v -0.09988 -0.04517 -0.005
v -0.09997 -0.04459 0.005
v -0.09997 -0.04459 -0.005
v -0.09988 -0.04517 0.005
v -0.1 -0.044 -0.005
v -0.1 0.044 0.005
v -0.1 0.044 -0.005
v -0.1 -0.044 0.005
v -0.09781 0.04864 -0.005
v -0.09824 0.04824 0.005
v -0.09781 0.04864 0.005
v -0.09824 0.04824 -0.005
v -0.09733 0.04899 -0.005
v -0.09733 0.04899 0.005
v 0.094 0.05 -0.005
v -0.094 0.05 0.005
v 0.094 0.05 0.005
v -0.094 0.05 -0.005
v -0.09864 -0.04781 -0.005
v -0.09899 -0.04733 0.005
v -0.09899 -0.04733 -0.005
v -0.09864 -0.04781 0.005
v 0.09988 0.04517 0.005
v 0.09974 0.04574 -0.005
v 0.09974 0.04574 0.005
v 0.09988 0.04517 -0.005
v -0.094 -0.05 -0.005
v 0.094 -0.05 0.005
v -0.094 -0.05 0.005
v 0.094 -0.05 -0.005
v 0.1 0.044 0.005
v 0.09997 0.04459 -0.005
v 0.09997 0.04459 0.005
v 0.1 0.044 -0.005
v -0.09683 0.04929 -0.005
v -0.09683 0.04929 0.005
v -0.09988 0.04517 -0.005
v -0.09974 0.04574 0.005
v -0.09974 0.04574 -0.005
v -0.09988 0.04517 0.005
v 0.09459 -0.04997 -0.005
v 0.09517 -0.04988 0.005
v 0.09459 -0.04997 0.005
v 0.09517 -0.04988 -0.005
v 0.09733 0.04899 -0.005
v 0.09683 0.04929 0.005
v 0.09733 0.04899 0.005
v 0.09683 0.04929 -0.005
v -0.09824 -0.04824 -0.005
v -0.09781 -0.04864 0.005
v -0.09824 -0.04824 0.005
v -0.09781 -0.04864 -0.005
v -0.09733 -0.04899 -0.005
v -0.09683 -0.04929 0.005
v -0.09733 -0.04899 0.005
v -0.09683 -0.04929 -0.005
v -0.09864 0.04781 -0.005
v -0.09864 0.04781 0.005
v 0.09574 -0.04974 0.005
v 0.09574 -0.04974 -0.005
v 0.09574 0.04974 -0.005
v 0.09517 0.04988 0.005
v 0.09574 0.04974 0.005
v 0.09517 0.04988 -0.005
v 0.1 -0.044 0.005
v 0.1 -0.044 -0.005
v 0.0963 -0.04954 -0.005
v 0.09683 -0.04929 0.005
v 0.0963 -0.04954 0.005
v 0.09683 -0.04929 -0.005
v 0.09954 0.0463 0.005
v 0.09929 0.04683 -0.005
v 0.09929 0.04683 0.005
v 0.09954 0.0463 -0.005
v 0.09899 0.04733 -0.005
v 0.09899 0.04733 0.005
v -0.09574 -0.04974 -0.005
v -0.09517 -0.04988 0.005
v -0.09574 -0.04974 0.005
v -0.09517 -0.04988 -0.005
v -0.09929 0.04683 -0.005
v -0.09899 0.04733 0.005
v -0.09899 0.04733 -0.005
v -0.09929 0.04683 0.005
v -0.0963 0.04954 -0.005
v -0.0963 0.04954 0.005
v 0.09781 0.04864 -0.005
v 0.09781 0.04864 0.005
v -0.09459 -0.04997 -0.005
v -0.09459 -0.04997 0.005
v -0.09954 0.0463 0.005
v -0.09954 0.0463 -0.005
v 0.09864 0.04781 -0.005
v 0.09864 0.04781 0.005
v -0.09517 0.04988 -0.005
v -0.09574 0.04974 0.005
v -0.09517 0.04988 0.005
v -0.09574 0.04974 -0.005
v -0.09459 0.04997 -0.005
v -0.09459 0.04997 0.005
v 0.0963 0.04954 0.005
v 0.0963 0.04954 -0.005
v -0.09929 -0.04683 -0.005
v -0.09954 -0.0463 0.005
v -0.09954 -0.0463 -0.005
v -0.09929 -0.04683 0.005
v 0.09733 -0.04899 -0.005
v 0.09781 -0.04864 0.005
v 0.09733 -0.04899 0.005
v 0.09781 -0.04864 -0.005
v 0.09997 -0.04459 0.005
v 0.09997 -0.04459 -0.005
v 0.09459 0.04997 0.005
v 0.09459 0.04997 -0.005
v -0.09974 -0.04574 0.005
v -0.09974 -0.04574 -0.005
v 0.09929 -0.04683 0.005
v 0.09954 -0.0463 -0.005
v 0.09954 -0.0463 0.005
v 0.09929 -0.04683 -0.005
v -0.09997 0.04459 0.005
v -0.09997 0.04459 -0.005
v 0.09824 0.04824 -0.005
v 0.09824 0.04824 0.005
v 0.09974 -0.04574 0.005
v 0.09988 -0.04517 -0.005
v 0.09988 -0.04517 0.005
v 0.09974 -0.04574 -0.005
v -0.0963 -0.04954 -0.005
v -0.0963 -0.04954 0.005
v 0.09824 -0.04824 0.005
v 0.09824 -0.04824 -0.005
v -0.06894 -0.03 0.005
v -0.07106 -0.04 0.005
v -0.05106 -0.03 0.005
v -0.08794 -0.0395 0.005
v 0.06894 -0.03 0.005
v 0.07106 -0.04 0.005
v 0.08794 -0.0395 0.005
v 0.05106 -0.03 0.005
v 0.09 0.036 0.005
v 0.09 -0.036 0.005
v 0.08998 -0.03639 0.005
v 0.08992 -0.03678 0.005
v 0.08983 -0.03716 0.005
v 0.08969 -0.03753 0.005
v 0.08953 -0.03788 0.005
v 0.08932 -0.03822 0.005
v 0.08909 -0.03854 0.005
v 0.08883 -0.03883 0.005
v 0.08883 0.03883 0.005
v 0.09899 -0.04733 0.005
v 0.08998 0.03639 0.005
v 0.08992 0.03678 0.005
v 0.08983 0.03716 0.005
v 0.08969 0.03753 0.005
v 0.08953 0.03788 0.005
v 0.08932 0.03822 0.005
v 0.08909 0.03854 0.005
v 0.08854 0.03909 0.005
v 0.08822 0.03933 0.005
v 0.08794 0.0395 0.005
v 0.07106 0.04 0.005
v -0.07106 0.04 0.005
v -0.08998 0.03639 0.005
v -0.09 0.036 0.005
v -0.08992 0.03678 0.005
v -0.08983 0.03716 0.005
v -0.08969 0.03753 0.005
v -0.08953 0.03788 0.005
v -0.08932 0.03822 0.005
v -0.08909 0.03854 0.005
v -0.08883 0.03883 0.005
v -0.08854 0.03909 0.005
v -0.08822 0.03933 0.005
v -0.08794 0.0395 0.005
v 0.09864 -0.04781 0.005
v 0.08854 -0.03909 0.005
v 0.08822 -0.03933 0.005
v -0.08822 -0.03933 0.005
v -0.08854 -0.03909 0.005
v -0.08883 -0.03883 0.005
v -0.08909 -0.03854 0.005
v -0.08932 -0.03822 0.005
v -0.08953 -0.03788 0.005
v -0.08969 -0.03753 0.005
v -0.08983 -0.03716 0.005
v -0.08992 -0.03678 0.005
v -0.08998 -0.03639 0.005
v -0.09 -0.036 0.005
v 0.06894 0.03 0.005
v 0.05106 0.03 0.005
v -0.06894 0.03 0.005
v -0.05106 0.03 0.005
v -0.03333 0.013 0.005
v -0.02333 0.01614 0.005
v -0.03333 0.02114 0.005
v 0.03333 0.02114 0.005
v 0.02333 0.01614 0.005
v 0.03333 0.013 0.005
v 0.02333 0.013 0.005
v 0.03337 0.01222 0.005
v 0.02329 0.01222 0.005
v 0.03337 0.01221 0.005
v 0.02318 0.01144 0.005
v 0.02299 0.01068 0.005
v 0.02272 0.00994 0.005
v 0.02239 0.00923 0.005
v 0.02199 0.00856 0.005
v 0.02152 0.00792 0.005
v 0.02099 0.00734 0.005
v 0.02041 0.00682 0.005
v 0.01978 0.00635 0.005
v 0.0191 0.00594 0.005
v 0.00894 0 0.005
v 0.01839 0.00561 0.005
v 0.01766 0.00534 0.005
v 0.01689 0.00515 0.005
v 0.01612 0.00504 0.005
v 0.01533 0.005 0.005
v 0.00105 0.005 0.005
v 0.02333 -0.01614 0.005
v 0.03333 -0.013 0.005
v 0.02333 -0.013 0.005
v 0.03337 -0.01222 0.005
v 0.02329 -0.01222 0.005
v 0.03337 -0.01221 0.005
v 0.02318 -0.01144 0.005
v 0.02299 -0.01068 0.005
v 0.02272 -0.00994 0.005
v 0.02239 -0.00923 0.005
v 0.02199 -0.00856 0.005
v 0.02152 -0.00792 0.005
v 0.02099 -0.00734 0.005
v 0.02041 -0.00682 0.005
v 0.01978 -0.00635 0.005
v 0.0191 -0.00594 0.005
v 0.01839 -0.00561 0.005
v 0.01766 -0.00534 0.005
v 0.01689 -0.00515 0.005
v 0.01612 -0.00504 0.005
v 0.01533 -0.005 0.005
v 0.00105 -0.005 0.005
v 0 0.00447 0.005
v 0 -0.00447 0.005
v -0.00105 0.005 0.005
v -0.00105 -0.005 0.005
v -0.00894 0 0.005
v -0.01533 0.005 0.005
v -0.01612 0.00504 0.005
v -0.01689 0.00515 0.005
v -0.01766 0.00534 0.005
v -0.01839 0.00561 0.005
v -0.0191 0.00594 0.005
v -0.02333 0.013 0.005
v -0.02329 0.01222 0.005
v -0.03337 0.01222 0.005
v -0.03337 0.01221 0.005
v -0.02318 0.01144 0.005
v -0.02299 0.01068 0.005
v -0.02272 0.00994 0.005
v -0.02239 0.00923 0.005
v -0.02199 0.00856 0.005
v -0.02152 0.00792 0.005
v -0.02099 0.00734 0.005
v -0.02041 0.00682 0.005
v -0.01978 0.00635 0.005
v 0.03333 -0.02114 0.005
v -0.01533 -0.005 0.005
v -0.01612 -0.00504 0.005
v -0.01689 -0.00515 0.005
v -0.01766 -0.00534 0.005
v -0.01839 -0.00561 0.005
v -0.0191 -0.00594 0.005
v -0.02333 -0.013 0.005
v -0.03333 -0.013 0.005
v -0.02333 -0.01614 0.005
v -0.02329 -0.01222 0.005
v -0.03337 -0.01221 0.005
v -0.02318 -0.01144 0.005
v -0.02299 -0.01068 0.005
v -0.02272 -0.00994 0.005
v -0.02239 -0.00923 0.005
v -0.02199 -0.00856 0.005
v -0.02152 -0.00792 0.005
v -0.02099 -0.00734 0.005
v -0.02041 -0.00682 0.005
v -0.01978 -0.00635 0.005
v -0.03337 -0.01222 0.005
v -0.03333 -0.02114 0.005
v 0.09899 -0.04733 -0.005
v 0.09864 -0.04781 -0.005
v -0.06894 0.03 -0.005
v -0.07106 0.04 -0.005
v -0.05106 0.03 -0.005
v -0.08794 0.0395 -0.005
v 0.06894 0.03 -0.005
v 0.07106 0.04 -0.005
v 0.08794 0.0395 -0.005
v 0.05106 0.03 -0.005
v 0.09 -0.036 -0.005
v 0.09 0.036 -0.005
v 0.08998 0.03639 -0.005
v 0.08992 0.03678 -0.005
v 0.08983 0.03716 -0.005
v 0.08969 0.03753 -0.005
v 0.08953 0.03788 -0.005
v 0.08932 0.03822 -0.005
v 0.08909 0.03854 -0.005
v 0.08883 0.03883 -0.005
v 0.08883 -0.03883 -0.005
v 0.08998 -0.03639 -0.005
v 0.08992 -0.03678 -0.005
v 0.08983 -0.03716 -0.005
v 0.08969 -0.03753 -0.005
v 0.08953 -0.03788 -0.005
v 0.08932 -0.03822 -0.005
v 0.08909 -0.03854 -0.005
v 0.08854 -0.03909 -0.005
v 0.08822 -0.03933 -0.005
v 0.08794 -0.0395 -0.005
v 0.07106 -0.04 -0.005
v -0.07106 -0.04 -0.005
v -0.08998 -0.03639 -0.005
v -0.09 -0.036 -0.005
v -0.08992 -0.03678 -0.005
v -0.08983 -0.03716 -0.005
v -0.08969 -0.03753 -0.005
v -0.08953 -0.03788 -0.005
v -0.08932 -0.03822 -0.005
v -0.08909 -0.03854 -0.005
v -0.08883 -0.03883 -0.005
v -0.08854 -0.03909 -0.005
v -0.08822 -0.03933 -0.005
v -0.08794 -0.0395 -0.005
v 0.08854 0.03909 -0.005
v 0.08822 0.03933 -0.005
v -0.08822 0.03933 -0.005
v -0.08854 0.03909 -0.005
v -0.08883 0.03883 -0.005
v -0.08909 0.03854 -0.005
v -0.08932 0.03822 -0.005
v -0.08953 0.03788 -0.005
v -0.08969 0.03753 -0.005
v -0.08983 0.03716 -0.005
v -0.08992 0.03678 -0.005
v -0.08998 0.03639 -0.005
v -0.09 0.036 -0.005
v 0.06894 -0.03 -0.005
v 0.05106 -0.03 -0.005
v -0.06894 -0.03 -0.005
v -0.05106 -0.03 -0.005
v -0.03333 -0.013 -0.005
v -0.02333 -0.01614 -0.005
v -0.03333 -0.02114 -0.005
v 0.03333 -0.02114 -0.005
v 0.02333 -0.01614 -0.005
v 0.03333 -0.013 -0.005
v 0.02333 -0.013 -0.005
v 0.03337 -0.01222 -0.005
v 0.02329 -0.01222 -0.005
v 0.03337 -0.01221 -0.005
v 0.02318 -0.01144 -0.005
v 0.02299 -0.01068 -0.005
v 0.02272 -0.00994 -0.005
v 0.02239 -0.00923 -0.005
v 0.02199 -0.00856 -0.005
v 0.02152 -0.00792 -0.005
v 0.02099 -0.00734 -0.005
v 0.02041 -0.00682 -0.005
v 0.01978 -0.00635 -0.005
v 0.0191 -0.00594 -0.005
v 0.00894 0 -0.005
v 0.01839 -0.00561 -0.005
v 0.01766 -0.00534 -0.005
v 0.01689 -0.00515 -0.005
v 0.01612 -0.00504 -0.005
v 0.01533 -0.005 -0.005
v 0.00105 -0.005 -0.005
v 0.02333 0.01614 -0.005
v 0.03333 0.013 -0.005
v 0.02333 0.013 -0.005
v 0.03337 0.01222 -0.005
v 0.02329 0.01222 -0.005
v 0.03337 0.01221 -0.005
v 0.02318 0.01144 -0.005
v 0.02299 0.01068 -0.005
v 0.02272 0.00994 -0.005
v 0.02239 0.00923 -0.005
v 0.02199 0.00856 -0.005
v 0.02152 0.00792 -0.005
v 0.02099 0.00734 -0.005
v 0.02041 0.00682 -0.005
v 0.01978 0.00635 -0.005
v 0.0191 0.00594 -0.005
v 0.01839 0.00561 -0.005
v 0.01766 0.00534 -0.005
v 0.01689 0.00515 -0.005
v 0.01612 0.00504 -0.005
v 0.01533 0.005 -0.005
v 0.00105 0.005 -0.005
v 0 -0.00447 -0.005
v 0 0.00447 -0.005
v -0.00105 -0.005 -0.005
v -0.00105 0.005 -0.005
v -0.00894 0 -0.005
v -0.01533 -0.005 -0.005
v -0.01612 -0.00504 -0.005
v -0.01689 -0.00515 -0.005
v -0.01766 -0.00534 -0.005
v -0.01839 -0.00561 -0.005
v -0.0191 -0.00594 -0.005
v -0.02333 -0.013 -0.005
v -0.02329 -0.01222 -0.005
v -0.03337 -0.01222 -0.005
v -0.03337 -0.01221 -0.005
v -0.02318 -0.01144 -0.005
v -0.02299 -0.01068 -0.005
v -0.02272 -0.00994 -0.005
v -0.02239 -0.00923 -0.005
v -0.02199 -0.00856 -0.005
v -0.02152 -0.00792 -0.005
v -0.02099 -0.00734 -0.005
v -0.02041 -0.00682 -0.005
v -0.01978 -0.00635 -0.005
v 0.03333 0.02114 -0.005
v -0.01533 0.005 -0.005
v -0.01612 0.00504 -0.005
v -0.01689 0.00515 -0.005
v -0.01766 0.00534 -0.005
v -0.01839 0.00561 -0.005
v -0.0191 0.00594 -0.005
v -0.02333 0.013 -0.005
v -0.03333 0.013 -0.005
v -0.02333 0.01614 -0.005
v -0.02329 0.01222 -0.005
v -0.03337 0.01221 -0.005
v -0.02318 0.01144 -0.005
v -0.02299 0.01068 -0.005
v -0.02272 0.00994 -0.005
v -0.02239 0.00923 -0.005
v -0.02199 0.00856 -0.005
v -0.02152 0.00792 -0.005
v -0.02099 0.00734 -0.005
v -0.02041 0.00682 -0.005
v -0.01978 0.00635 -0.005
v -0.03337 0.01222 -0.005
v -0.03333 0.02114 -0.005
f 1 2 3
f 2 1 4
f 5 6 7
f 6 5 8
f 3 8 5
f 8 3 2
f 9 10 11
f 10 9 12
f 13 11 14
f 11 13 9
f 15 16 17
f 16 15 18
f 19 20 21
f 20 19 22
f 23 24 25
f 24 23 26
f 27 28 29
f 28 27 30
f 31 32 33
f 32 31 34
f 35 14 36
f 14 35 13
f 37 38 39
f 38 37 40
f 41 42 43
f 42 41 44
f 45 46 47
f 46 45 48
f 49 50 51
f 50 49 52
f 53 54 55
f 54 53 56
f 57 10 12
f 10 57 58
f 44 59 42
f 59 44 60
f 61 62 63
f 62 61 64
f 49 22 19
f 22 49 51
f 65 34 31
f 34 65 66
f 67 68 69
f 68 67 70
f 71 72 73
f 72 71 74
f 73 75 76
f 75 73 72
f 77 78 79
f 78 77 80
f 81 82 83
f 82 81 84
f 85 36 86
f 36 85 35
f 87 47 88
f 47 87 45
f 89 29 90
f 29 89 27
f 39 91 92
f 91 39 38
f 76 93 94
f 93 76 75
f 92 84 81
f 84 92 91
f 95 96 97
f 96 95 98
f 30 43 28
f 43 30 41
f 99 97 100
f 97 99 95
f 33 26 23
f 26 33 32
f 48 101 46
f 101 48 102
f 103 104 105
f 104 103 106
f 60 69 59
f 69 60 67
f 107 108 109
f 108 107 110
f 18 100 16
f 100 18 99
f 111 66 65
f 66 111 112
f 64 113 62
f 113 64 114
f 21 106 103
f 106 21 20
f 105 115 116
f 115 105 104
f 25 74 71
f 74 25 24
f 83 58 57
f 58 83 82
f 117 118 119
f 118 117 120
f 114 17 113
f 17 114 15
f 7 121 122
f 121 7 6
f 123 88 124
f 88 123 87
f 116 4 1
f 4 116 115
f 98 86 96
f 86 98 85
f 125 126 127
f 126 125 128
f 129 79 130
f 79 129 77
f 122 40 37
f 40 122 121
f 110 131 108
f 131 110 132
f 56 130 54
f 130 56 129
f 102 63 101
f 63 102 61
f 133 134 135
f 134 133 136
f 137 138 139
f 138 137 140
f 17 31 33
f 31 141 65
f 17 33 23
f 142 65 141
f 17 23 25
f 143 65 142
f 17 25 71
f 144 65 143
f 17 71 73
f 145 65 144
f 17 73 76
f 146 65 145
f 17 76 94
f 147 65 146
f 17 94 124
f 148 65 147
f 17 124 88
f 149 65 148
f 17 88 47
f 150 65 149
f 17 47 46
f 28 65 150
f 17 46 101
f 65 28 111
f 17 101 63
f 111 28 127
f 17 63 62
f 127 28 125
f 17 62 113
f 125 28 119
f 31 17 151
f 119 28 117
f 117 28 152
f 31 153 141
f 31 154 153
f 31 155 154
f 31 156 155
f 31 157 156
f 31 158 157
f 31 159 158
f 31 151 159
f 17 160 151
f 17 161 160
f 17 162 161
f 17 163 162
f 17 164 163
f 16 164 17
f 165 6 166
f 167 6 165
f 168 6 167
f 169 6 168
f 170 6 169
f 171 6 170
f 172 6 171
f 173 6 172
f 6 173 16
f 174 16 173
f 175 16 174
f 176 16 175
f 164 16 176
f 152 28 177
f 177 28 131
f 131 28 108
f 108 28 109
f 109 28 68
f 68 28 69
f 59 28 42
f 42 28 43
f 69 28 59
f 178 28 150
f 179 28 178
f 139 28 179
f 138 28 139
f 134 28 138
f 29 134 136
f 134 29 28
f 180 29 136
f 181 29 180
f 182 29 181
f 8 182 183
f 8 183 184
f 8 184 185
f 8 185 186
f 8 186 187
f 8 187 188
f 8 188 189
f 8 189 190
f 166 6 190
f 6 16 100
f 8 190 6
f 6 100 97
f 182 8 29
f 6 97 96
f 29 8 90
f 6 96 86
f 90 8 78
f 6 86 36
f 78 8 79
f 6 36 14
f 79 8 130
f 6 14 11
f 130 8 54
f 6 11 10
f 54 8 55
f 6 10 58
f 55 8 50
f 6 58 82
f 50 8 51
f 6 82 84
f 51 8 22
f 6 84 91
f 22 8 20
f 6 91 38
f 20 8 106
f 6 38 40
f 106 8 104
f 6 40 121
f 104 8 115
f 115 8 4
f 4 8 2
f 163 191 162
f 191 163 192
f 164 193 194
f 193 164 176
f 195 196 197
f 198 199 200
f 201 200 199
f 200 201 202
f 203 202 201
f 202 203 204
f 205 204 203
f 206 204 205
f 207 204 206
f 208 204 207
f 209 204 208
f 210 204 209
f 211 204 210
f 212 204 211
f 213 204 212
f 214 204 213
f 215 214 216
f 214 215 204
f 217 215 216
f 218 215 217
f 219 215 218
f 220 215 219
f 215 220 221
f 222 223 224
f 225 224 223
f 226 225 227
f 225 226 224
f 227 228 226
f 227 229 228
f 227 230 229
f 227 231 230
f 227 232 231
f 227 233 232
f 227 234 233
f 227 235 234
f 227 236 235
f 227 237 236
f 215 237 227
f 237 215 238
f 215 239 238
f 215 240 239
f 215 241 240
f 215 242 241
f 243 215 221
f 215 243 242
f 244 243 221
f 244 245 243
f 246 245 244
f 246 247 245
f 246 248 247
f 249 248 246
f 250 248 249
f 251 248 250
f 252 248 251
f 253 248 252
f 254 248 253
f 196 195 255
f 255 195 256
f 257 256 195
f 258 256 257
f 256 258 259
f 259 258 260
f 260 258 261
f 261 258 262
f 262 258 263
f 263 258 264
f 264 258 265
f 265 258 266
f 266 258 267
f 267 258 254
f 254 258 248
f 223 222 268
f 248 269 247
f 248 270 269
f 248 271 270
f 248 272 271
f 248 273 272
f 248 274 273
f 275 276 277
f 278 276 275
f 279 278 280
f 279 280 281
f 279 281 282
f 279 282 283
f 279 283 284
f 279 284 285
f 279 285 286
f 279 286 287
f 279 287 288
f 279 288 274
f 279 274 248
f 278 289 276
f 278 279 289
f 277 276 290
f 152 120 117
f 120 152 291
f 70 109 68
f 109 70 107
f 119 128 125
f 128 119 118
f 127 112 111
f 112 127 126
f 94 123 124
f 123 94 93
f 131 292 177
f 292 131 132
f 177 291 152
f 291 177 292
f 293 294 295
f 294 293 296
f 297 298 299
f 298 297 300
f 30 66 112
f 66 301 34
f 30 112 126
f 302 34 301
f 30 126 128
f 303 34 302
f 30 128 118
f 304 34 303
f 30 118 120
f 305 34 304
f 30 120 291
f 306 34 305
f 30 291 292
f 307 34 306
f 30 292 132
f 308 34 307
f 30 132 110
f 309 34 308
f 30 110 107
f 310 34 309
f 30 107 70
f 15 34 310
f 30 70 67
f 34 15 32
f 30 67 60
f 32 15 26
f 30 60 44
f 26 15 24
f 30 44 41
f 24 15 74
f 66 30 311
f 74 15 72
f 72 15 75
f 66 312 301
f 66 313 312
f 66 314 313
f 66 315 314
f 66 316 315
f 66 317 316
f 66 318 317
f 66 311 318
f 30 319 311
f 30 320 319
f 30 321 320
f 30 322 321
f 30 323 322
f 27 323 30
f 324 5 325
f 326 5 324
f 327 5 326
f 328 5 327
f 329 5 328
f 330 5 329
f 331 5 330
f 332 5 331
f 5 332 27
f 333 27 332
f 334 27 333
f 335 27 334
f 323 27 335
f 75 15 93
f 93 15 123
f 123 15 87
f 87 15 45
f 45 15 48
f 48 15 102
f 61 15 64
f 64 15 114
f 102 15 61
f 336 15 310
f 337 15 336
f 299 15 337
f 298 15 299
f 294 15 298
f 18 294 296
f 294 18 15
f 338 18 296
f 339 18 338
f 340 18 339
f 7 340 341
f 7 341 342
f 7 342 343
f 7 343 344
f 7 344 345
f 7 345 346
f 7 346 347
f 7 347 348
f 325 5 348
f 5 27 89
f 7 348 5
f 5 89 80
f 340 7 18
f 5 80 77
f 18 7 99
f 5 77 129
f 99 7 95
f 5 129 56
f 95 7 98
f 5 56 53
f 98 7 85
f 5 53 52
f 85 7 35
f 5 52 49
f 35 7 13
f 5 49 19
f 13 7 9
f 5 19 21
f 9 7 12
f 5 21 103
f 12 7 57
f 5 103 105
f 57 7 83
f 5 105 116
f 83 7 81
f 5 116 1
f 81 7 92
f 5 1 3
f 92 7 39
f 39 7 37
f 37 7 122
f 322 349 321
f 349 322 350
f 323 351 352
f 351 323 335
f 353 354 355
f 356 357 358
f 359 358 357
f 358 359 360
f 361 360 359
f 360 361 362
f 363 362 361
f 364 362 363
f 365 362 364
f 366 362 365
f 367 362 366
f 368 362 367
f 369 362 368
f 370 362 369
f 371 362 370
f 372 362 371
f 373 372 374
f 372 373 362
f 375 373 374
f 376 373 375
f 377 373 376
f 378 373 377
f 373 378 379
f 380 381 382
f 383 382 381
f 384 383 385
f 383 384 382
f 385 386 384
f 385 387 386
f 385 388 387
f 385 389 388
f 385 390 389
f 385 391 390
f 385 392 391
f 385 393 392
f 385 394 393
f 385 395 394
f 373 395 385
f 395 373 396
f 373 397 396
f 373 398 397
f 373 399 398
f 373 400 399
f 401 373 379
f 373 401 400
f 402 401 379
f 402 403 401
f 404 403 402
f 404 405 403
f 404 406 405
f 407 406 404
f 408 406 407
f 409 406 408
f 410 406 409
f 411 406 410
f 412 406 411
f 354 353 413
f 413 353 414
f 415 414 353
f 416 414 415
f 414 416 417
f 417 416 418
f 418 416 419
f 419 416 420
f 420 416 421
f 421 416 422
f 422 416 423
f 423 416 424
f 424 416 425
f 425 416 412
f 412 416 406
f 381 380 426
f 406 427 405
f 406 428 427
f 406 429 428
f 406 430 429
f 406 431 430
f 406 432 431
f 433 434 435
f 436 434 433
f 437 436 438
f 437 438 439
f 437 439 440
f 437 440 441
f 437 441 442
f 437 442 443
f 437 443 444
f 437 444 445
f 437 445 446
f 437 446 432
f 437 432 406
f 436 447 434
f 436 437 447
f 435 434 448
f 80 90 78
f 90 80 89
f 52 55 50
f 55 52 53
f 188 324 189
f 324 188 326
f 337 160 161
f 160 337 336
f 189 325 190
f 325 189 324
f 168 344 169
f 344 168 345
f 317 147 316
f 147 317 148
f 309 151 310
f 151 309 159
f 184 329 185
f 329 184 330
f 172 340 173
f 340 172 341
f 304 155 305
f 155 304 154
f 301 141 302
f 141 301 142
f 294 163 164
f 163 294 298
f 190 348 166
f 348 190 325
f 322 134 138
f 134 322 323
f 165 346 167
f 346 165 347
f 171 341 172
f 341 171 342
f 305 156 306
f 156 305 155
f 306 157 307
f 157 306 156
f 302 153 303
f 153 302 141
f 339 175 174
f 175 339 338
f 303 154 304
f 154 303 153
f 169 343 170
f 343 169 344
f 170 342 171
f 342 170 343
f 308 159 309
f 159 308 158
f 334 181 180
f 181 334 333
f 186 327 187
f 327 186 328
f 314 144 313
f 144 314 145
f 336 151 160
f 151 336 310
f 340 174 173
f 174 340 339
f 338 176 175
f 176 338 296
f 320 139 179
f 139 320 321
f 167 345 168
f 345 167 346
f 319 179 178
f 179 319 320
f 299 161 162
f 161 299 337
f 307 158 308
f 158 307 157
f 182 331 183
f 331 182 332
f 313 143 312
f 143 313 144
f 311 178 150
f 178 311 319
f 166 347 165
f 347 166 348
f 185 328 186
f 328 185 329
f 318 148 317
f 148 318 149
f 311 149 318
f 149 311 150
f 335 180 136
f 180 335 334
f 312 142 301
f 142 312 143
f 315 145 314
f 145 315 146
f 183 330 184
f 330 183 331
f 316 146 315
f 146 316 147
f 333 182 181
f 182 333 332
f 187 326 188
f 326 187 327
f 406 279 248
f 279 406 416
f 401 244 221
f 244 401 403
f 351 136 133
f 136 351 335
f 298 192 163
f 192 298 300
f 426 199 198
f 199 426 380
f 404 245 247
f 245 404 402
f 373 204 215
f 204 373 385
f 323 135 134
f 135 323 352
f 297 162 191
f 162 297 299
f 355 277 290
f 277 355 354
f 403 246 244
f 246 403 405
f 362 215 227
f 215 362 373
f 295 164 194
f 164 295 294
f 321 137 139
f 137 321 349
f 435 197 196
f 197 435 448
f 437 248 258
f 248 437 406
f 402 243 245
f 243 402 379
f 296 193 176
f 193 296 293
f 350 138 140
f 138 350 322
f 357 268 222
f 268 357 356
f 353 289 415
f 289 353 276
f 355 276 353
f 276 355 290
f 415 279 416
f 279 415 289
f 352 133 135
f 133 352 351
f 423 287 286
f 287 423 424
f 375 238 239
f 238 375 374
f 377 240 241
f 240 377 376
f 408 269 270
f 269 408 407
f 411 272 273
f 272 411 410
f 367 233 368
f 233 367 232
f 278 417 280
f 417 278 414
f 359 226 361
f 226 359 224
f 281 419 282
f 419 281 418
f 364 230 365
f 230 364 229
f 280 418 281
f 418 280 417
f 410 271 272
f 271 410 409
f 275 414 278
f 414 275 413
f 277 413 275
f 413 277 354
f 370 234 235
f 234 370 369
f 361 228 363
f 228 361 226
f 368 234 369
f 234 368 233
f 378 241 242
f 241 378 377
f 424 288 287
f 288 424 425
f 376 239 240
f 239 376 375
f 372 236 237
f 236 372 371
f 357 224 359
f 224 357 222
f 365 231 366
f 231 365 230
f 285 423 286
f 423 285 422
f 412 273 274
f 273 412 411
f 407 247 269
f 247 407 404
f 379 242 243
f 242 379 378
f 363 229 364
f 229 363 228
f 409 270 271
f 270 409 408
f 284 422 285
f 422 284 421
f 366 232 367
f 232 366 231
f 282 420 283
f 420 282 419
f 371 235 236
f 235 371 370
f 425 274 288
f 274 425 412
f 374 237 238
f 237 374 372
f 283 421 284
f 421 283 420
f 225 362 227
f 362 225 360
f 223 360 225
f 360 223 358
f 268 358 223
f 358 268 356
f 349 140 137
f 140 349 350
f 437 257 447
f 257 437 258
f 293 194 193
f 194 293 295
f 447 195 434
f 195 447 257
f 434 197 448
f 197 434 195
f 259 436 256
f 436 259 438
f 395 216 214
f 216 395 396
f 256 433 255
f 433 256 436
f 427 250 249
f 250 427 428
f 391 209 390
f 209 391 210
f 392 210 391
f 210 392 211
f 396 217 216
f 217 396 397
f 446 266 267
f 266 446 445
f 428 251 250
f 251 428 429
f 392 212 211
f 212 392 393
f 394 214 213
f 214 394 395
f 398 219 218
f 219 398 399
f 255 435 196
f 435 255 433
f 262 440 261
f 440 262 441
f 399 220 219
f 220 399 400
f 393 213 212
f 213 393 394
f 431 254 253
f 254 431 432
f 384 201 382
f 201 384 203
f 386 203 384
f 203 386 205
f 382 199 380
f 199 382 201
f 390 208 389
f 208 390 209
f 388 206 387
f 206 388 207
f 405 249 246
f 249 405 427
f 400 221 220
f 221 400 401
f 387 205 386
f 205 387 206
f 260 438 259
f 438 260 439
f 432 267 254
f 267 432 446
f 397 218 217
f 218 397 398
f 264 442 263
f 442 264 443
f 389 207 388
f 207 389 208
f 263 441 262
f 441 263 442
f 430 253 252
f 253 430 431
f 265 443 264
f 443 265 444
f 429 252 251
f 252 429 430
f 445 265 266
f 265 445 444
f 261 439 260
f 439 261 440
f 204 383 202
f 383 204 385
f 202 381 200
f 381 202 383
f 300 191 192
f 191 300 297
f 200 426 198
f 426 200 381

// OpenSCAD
$fn=64;

plate_x = 0.2;
plate_y = 0.1;
plate_t = 0.01;

frame_w = 0.01;

grid_cols = 3;
grid_rows = 2;

gap_x = 0.01;
gap_y = 0.01;

cut_rx = 0.008;
cut_ry = 0.008;

rib_w = 0.008;
rib_t = plate_t;

module rounded_rect_2d(w, h, r){
    r2 = min(r, w/2, h/2);
    hull(){
        translate([ w/2 - r2,  h/2 - r2]) circle(r=r2);
        translate([-w/2 + r2,  h/2 - r2]) circle(r=r2);
        translate([ w/2 - r2, -h/2 + r2]) circle(r=r2);
        translate([-w/2 + r2, -h/2 + r2]) circle(r=r2);
    }
}

module rounded_rect_prism(w, h, r, t){
    linear_extrude(height=t, center=true)
        rounded_rect_2d(w, h, r);
}

module base_plate(){
    rounded_rect_prism(plate_x, plate_y, 0.006, plate_t);
}

module frame_ring(){
    difference(){
        rounded_rect_prism(plate_x, plate_y, 0.006, plate_t);
        rounded_rect_prism(plate_x - 2*frame_w, plate_y - 2*frame_w, 0.004, plate_t + 0.002);
    }
}

module cutout_grid(){
    inner_x = plate_x - 2*frame_w;
    inner_y = plate_y - 2*frame_w;

    cell_w = (inner_x - (grid_cols+1)*gap_x)/grid_cols;
    cell_h = (inner_y - (grid_rows+1)*gap_y)/grid_rows;

    cut_w = cell_w;
    cut_h = cell_h;

    for (r=[0:grid_rows-1]){
        for (c=[0:grid_cols-1]){
            x = -inner_x/2 + gap_x + cut_w/2 + c*(cut_w + gap_x);
            y = -inner_y/2 + gap_y + cut_h/2 + r*(cut_h + gap_y);
            translate([x, y, 0])
                rounded_rect_prism(cut_w, cut_h, min(cut_rx, cut_ry, cut_w/2, cut_h/2), plate_t + 0.002);
        }
    }
}

module rib_diag(angle_deg){
    len = sqrt(plate_x*plate_x + plate_y*plate_y) + 0.05;
    rotate([0,0,angle_deg])
        cube([len, rib_w, rib_t], center=true);
}

module ribs(){
    union(){
        rib_diag(atan2(plate_y, plate_x));
        rib_diag(-atan2(plate_y, plate_x));
    }
}

module panel(){
    difference(){
        union(){
            frame_ring();
            intersection(){
                base_plate();
                ribs();
            }
        }
        cutout_grid();
    }
}

panel();
